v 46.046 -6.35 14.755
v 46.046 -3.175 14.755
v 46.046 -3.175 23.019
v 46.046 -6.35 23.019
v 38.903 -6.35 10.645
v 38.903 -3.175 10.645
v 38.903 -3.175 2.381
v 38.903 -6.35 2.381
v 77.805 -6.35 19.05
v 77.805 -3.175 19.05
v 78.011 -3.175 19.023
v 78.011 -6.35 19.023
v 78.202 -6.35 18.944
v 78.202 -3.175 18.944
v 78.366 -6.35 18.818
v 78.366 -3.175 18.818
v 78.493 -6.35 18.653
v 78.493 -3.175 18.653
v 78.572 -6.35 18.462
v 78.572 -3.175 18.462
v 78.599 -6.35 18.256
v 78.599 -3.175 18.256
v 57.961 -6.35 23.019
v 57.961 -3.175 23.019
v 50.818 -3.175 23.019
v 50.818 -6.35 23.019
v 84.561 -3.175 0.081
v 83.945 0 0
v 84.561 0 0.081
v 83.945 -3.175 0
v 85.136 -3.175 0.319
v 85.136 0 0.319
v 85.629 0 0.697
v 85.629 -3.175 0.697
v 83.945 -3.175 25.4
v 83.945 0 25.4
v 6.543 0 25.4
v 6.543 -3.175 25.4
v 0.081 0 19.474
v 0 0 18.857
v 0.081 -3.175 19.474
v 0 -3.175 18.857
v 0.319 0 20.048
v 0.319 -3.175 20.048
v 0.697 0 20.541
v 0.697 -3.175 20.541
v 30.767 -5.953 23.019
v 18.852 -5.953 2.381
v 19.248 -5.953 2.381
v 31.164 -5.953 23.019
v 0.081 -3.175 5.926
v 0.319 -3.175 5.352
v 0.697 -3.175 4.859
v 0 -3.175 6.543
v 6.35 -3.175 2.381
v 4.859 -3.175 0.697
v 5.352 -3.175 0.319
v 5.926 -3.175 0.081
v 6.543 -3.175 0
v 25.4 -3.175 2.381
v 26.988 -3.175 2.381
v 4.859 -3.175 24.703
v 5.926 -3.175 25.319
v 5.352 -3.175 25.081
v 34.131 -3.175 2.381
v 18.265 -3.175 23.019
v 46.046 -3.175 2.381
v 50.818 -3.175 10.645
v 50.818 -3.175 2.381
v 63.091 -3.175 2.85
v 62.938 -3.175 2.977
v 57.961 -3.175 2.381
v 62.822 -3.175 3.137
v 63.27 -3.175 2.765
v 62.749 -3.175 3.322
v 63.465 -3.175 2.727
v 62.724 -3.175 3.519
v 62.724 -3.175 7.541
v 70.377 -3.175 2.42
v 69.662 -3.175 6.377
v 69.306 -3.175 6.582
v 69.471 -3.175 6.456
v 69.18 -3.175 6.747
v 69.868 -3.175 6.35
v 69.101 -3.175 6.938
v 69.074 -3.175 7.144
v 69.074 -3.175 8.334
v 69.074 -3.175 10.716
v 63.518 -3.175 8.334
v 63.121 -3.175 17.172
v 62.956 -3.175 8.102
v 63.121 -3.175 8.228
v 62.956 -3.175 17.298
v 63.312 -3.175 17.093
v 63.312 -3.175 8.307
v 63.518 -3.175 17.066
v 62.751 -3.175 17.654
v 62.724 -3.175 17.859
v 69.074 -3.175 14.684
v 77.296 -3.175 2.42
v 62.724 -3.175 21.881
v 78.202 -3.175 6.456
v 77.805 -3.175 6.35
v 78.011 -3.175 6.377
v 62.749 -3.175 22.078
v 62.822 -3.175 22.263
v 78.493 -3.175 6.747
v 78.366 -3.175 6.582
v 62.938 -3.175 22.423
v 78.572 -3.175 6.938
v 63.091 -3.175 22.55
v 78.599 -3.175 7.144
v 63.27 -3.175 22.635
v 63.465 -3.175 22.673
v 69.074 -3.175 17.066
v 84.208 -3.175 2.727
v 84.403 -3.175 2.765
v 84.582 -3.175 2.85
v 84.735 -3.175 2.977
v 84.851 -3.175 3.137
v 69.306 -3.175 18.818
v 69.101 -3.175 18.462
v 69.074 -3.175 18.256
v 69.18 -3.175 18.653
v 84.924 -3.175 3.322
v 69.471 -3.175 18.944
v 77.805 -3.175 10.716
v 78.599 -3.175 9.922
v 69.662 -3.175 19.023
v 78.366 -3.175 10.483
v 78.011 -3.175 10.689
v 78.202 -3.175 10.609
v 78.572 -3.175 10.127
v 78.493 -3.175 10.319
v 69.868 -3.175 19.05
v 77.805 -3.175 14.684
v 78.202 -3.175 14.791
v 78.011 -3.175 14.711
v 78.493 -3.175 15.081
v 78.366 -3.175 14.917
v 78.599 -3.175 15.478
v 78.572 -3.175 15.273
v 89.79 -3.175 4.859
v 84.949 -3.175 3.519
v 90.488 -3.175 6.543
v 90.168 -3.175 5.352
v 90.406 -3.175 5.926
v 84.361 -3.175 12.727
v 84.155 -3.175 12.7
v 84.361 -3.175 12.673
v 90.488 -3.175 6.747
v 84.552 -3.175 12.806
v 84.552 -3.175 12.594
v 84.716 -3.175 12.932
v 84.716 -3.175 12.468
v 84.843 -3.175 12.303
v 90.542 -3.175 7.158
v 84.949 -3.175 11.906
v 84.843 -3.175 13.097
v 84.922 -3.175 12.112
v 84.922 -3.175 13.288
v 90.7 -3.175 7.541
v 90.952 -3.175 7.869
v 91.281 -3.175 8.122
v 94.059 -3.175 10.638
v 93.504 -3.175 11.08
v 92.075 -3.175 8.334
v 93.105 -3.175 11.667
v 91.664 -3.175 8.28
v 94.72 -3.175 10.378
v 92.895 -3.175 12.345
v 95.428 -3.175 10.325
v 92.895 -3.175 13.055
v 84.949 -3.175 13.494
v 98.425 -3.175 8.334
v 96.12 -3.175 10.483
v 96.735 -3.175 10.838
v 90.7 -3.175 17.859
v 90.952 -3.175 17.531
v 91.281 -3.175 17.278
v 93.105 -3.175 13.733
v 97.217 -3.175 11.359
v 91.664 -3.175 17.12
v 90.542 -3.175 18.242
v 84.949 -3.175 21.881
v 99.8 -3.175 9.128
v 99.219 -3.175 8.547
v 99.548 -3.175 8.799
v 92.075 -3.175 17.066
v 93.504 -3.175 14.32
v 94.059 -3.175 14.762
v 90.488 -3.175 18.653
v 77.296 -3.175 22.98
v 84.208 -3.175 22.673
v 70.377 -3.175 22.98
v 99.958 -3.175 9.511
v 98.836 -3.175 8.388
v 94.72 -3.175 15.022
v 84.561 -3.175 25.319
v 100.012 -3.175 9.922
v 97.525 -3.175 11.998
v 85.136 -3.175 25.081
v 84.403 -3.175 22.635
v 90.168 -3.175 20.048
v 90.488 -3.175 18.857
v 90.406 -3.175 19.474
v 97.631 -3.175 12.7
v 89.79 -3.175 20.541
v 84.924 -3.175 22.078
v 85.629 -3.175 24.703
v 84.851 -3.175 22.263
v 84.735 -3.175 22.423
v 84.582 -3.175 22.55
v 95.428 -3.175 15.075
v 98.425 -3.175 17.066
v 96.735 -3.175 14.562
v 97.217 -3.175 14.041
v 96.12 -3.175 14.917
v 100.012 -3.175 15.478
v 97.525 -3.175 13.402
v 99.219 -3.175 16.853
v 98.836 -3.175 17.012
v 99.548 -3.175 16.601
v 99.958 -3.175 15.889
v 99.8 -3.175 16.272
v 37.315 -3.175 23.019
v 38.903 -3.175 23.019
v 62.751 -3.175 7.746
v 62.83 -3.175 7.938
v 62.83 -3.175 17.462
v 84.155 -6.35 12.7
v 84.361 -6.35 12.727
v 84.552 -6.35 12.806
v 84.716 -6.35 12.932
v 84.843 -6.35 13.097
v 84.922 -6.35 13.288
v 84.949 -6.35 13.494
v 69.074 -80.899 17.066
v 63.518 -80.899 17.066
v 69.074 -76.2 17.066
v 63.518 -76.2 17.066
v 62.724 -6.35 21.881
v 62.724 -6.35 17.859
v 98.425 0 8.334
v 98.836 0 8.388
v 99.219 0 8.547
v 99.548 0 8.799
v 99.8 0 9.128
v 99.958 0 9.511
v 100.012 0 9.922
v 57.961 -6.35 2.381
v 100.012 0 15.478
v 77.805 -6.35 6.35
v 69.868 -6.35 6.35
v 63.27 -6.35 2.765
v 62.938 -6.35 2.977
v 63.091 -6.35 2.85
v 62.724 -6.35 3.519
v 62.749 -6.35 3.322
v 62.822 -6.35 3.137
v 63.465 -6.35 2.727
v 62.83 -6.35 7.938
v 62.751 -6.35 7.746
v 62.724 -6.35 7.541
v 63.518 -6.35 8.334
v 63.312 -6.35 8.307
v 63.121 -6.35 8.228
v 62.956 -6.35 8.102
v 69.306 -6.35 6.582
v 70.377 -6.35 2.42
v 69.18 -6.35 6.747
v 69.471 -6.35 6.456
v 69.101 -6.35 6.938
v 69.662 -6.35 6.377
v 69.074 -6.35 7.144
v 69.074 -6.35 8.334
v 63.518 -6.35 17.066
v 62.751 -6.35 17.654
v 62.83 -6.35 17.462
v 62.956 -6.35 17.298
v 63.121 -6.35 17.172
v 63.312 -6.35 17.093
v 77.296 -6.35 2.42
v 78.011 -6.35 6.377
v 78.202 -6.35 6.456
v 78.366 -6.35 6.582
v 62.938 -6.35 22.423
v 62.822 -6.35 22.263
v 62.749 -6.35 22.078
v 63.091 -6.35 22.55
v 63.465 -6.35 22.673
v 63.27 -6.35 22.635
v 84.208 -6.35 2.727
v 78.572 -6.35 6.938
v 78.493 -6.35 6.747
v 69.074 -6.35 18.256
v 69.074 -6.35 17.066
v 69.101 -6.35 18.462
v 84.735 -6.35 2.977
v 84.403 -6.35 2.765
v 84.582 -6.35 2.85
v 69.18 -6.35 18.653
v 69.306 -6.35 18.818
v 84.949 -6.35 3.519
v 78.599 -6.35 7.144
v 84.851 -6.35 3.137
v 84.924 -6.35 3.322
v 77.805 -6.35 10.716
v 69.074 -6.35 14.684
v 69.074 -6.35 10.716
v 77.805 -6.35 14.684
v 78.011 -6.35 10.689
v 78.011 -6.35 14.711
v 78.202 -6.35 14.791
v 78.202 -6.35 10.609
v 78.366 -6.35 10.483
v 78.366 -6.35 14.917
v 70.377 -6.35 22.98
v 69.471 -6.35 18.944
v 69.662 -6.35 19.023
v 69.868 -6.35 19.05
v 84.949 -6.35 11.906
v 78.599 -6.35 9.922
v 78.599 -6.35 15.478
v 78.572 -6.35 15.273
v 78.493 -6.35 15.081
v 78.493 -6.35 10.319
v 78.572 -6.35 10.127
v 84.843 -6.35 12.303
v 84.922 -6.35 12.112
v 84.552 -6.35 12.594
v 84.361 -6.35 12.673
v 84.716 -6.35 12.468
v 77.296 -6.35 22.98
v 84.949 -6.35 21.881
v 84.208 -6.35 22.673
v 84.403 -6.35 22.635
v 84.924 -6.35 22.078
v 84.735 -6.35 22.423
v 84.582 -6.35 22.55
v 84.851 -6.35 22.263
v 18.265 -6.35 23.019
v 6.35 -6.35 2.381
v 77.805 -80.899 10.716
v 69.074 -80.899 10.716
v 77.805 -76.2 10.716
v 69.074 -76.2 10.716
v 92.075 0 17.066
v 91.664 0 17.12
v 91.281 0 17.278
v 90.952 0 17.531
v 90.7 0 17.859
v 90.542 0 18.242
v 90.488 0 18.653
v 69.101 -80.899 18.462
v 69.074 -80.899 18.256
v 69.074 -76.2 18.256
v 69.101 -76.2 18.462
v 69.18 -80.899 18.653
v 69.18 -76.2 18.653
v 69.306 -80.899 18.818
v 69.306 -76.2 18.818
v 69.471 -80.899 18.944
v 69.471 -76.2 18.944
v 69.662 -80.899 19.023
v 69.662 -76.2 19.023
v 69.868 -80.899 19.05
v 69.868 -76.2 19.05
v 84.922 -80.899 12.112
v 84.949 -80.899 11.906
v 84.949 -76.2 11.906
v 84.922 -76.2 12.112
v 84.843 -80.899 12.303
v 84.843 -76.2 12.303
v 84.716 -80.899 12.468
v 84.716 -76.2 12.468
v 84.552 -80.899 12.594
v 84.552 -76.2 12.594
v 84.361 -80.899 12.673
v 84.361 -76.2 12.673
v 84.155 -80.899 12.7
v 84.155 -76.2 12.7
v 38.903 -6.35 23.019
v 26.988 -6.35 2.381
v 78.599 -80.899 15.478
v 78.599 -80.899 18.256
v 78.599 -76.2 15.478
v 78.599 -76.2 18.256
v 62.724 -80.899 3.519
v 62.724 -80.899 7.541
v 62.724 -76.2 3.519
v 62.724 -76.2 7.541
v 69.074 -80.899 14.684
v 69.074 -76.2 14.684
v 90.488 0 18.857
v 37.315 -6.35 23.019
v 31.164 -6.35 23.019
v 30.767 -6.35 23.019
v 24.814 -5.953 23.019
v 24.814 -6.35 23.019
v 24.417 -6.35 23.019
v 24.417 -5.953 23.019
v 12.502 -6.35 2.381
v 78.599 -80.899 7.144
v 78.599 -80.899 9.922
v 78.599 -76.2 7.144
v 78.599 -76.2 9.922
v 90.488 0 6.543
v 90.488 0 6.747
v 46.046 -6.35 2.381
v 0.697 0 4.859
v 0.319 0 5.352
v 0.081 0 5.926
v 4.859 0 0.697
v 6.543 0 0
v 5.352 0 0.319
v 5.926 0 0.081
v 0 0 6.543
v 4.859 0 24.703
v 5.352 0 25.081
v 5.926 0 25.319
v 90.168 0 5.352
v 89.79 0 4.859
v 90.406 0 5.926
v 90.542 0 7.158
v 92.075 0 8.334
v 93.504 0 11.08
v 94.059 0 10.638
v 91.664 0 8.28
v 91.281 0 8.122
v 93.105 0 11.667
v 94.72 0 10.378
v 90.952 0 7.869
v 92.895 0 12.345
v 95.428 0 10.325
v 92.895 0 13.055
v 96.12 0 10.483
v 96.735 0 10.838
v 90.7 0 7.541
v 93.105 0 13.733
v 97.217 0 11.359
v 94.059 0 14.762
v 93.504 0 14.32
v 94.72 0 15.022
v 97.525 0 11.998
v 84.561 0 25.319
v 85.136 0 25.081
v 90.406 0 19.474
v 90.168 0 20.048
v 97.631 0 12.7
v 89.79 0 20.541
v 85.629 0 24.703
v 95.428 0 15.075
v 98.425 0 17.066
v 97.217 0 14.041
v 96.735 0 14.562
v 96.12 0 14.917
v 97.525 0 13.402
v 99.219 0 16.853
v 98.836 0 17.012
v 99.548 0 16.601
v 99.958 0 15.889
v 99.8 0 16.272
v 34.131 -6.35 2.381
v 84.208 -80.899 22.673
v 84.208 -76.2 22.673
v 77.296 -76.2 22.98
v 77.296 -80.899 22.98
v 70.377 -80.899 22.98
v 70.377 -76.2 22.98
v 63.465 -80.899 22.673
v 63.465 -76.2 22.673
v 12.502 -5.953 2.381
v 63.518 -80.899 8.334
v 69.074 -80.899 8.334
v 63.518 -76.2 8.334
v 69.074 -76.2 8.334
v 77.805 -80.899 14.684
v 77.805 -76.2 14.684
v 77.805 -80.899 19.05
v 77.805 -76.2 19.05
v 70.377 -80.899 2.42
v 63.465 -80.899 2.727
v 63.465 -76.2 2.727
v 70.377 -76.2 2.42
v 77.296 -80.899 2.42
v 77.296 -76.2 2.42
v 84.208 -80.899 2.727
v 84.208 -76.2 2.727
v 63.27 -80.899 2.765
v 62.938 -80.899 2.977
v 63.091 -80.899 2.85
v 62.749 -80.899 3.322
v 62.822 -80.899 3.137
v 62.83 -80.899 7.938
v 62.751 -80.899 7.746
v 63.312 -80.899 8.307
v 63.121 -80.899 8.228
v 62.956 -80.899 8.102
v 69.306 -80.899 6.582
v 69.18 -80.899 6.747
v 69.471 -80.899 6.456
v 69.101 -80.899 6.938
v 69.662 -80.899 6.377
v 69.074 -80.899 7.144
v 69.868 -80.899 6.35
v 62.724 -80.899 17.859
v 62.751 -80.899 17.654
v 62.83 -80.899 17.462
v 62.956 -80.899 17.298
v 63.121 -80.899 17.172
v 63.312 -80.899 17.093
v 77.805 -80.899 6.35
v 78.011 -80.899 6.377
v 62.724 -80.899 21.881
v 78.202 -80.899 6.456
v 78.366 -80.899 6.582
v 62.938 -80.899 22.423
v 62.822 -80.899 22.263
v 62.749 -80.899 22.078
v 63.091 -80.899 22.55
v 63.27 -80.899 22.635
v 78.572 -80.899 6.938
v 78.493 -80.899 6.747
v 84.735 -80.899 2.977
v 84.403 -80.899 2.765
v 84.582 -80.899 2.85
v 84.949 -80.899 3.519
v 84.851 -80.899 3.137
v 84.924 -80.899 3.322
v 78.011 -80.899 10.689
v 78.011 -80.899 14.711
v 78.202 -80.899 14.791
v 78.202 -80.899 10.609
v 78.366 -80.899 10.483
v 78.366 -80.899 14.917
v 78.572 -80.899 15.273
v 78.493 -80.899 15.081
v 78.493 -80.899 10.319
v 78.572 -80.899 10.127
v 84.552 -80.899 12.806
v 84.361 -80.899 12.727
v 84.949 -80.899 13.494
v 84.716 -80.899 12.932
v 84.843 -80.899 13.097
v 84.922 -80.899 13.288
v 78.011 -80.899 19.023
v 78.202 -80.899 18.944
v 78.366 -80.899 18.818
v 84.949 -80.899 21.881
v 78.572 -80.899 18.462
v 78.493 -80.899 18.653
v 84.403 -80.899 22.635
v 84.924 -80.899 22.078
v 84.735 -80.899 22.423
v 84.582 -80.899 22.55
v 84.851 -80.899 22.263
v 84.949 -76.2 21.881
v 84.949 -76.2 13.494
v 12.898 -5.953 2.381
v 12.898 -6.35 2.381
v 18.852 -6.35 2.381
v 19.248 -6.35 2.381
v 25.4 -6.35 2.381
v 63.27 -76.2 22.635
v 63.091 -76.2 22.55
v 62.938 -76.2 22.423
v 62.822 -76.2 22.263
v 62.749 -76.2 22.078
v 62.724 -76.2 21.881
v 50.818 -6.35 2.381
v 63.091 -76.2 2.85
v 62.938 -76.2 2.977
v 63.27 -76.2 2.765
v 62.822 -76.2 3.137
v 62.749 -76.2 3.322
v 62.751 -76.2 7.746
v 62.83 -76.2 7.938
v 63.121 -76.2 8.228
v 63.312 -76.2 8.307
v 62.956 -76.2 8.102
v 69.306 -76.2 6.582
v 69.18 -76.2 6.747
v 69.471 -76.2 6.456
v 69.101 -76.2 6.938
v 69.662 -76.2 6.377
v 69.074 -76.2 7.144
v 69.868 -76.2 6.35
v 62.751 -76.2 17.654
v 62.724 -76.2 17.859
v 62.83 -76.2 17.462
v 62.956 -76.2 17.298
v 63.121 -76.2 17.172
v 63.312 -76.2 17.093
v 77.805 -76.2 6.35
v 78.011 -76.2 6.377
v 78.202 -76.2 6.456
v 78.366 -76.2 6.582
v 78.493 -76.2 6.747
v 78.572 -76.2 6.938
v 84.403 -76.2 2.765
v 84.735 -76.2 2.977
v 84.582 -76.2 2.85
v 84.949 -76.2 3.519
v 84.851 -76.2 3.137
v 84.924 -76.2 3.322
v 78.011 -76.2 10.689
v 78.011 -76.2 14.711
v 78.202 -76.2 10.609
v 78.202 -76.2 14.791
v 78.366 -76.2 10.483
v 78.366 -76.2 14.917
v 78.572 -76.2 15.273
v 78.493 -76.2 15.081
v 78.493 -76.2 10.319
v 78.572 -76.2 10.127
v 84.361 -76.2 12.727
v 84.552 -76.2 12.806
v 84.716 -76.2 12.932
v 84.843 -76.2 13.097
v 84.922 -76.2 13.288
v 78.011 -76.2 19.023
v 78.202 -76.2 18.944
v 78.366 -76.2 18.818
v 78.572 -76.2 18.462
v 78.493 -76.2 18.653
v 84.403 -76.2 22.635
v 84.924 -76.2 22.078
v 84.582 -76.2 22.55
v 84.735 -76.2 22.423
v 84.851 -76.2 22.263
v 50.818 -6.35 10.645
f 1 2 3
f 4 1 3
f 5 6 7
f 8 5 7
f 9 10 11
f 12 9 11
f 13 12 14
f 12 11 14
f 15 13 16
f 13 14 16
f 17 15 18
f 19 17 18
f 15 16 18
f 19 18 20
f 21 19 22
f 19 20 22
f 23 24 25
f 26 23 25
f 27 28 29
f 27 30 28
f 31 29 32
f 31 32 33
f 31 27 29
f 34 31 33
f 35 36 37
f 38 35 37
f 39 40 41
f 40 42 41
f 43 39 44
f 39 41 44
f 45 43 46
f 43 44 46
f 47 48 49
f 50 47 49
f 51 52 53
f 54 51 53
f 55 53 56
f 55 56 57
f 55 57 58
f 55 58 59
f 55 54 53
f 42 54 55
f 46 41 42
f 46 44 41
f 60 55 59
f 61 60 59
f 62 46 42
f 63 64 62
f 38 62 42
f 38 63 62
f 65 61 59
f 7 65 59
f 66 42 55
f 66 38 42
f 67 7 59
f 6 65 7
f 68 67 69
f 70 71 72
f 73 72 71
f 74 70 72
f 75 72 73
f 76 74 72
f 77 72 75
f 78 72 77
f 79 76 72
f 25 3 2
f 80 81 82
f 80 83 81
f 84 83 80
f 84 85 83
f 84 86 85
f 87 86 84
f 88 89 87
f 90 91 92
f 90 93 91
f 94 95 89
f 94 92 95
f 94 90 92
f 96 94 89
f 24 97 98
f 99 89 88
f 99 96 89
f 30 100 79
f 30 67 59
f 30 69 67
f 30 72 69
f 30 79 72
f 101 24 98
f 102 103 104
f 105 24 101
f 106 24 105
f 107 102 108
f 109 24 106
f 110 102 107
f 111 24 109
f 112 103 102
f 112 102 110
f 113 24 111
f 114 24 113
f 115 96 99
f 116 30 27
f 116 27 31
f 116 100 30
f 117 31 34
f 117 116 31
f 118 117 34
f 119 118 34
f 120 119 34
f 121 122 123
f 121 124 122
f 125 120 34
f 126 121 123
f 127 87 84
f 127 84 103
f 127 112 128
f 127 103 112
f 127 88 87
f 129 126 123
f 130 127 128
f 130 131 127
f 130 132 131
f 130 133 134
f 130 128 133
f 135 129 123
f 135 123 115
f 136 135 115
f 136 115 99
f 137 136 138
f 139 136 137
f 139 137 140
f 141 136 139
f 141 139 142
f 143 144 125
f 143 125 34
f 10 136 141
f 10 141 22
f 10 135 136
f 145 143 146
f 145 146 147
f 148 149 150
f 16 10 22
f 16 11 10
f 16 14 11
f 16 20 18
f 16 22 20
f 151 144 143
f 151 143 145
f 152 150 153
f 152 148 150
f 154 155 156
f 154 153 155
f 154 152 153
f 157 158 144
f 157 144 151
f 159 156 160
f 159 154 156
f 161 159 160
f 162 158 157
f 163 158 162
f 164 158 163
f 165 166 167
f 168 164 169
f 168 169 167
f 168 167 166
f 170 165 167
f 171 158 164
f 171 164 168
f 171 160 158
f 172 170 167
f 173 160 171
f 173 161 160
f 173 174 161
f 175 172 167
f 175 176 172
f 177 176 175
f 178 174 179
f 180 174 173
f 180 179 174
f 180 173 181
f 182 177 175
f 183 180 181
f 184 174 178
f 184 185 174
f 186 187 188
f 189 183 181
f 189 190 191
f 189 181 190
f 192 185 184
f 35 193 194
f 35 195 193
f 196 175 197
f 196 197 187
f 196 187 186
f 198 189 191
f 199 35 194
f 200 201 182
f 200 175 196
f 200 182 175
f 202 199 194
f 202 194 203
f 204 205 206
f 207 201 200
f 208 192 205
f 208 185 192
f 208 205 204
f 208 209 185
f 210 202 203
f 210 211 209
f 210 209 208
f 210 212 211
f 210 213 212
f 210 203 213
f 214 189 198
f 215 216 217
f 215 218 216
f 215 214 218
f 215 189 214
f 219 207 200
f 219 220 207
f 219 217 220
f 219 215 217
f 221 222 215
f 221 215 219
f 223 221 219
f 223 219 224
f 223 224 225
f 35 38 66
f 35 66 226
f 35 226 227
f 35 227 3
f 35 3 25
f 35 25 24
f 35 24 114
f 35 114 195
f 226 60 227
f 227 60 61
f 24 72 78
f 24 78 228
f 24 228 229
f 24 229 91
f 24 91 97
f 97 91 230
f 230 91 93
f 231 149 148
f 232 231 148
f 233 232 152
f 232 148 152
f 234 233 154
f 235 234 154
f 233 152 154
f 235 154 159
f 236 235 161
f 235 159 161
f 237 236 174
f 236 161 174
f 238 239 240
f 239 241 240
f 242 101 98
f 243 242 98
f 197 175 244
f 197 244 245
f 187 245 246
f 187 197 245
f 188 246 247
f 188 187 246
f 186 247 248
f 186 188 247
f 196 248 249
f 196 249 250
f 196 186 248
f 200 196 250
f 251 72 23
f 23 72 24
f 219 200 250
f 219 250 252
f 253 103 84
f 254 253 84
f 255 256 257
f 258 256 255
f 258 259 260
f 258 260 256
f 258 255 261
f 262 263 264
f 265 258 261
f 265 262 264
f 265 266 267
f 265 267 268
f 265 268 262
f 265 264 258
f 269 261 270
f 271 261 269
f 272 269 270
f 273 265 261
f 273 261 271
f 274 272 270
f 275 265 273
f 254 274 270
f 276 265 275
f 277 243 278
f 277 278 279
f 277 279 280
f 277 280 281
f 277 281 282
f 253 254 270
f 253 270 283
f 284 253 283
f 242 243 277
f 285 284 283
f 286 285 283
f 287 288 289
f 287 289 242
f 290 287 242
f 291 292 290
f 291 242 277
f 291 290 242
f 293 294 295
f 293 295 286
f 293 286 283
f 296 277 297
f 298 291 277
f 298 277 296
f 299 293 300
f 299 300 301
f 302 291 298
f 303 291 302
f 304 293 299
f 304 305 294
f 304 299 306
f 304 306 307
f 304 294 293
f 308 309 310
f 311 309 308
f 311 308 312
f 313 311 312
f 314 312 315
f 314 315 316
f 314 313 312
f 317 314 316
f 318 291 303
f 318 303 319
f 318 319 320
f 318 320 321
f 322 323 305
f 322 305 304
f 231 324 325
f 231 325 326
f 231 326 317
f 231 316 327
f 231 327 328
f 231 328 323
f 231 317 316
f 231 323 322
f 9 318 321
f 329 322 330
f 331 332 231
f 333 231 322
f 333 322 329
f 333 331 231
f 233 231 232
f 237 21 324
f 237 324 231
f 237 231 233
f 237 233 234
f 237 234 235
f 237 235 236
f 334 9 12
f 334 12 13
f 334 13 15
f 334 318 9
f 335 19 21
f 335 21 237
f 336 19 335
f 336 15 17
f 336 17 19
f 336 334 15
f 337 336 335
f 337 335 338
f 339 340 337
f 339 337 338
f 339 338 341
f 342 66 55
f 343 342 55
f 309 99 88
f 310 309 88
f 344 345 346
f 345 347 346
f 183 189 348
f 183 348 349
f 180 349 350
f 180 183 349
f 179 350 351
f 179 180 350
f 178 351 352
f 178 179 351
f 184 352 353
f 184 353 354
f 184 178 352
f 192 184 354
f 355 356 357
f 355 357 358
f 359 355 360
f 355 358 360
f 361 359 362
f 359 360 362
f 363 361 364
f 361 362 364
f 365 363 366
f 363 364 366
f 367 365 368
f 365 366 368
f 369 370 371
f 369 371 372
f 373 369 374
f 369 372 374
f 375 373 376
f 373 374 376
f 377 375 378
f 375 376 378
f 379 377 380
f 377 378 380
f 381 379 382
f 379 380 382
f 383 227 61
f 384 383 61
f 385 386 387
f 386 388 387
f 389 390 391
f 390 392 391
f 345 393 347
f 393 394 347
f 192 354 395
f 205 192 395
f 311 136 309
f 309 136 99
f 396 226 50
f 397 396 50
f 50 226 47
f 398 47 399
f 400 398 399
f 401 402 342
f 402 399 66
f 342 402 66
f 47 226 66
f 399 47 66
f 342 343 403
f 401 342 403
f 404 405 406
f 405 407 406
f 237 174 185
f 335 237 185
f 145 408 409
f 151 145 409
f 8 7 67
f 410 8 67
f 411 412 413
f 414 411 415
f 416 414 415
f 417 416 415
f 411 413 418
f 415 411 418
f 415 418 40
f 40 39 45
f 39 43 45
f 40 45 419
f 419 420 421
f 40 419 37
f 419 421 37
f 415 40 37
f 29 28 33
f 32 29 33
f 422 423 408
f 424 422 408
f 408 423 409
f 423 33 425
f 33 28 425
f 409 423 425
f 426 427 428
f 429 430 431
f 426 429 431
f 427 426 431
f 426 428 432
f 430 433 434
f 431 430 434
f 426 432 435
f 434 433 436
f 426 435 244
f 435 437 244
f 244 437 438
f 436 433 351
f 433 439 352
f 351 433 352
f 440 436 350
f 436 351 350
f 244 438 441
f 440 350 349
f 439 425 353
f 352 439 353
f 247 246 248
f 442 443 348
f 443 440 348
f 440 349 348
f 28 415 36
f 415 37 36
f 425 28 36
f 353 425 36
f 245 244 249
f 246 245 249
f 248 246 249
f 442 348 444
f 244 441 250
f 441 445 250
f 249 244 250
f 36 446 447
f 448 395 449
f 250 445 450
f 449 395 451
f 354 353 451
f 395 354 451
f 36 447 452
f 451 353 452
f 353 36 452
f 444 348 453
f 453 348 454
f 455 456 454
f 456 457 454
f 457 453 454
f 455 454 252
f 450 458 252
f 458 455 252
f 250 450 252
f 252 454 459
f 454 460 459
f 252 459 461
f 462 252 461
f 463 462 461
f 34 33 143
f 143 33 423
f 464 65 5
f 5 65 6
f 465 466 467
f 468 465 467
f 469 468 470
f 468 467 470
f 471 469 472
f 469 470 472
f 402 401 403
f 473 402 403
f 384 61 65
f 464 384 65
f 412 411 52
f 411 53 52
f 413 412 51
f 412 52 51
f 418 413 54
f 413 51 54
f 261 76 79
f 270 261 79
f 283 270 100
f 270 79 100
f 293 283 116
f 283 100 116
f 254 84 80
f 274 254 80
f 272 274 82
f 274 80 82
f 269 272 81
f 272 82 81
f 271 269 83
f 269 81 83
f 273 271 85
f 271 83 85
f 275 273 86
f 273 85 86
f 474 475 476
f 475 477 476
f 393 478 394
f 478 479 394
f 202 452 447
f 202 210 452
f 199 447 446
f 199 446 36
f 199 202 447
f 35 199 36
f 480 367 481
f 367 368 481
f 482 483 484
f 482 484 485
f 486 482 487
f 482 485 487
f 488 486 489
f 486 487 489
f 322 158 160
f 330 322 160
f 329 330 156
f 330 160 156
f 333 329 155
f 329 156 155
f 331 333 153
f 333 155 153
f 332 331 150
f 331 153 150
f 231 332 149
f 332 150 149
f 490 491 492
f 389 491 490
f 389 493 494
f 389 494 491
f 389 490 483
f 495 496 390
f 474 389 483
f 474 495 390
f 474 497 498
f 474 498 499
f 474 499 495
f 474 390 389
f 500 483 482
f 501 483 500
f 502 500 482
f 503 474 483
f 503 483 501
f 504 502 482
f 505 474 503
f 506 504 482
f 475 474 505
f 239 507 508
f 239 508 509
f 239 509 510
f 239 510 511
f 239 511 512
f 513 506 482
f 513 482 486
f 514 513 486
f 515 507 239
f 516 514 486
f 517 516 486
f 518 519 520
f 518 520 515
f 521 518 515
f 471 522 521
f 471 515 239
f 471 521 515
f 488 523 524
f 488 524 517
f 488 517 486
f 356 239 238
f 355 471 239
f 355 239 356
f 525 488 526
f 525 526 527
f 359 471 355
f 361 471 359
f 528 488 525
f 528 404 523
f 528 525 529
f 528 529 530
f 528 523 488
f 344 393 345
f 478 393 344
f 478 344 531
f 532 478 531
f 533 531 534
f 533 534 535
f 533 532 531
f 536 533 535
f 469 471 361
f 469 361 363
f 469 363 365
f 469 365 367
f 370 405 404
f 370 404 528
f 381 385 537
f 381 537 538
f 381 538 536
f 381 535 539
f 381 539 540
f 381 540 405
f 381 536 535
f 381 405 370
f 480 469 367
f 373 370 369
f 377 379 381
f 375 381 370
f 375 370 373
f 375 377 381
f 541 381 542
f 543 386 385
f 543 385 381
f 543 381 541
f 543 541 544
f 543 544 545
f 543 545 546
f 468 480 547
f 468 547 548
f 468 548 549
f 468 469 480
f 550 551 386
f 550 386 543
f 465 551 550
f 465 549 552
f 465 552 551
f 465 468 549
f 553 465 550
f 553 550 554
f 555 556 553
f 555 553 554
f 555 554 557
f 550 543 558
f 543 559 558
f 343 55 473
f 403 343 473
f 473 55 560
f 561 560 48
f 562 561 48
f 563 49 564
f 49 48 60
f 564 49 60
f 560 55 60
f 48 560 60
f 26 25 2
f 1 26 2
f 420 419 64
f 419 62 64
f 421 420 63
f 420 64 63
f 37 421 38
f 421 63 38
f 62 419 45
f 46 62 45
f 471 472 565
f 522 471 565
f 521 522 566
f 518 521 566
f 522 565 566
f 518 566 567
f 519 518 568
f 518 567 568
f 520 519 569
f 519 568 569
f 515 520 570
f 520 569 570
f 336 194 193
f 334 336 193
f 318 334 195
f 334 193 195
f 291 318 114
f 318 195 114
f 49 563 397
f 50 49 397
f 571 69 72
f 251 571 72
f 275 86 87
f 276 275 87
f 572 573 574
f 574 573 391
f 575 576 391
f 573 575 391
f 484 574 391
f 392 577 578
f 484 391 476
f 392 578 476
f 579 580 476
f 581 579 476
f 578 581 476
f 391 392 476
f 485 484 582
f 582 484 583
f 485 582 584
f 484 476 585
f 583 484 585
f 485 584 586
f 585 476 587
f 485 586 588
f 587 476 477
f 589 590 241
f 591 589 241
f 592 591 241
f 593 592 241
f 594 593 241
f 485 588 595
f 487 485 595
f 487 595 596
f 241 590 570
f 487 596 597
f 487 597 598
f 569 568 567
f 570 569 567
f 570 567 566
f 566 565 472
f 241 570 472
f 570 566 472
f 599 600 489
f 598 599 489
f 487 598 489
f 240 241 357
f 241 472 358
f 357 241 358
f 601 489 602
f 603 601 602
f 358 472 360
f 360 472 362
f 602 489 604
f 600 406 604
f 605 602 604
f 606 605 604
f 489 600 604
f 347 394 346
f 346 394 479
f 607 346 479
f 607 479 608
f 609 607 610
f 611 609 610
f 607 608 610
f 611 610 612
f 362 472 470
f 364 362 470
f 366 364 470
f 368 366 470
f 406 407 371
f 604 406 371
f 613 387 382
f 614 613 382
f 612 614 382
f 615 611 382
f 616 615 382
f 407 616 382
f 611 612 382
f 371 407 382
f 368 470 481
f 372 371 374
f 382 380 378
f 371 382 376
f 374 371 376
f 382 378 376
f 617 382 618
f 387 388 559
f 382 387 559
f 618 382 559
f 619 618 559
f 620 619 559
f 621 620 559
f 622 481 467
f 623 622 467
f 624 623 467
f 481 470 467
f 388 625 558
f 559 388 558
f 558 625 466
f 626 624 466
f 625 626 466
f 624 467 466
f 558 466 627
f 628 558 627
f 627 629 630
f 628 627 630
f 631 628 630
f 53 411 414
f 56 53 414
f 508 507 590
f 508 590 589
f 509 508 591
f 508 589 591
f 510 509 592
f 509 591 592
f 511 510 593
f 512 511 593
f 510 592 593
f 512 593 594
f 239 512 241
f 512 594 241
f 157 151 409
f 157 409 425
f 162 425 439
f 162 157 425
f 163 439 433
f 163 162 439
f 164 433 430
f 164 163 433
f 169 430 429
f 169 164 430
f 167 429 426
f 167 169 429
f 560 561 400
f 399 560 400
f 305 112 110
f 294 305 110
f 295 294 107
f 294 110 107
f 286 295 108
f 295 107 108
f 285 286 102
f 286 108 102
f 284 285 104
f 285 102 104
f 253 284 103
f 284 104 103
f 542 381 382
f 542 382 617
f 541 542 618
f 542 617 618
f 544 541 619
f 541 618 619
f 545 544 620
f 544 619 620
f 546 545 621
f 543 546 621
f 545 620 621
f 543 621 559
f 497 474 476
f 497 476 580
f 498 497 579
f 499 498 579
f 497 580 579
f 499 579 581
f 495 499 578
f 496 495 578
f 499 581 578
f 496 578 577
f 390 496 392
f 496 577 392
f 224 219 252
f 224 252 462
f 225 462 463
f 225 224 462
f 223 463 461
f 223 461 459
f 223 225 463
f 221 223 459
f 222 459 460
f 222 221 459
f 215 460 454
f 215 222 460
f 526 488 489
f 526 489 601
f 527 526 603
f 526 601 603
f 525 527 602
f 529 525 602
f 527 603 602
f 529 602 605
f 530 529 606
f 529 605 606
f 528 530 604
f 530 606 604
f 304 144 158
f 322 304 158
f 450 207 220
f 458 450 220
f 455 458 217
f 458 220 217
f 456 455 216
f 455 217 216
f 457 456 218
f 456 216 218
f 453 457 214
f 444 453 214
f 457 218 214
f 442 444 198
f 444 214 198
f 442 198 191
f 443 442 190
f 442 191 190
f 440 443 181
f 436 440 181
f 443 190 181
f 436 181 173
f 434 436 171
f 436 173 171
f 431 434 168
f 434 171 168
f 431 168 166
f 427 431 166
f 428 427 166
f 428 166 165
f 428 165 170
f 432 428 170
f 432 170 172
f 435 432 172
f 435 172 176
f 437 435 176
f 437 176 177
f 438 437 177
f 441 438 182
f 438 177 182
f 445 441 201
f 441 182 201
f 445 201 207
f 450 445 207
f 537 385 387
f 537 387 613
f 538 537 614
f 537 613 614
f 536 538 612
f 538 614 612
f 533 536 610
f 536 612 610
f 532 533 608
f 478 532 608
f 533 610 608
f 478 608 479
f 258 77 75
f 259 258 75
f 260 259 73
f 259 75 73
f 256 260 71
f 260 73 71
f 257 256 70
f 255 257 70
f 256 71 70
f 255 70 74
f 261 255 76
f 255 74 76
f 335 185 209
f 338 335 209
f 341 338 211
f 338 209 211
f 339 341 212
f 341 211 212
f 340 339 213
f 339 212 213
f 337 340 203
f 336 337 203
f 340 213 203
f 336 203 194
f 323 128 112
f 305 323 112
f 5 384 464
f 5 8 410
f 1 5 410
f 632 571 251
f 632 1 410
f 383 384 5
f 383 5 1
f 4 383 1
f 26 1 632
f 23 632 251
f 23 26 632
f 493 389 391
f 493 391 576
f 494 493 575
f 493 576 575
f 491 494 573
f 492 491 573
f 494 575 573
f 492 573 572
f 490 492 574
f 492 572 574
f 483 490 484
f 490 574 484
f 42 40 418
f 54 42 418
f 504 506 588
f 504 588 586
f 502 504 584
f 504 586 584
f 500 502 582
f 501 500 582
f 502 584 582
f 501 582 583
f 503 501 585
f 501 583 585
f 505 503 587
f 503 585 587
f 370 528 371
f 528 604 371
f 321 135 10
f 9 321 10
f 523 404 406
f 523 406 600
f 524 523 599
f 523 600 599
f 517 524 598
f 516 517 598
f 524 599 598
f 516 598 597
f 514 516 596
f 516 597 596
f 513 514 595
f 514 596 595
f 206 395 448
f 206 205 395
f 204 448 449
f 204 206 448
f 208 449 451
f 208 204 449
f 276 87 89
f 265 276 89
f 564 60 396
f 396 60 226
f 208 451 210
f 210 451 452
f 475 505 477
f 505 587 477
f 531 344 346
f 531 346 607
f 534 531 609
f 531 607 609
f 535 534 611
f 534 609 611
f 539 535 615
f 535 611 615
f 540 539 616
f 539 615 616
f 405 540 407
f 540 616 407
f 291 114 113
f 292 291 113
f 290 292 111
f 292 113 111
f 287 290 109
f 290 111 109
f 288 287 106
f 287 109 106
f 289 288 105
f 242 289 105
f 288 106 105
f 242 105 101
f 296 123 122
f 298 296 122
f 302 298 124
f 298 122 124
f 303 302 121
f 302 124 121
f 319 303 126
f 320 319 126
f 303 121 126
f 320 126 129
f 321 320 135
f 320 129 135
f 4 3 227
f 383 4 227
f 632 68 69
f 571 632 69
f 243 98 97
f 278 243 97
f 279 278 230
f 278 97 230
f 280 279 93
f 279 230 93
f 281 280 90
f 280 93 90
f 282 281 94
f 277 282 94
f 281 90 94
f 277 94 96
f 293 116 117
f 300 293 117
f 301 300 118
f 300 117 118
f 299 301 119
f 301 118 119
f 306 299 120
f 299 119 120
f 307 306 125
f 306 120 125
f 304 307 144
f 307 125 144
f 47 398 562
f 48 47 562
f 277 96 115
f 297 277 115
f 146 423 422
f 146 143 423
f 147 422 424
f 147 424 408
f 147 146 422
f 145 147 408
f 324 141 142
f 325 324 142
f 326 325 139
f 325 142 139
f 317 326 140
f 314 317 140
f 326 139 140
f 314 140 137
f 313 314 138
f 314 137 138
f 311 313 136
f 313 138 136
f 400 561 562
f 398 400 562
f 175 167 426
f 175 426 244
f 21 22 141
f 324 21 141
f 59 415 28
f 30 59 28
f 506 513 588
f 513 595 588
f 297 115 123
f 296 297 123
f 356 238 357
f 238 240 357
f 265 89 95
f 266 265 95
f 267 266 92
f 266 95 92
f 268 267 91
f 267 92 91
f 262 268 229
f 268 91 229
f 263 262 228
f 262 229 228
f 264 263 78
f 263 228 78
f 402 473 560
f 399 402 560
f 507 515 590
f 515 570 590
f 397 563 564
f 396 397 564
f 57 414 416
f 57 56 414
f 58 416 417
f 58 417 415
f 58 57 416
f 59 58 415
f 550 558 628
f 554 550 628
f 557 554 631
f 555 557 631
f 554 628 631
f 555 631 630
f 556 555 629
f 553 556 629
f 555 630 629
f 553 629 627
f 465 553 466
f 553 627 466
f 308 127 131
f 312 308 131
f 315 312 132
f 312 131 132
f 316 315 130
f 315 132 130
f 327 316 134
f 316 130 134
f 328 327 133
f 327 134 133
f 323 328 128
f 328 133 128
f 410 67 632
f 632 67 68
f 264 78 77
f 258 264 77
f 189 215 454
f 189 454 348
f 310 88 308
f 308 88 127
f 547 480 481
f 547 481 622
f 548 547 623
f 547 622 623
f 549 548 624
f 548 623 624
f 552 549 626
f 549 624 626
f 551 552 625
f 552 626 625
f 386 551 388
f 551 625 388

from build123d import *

# Parameters (mm, degrees)
F1_DEPTH  = 3.175
F3_DEPTH  = 3.175
F5_DEPTH  = 0.396875
F6_R      = 2.38125
F7_R      = 2.38125
F8_DEPTH  = 3.175
F11_DEPTH = 3.175
F12_DEPTH = 1.524


# Not quite as in the source:
# - a feature names something its author has since deleted; it is built from what else it names


with BuildPart() as f1:
    # F0 (on Front) → F1 (new body)
    with BuildSketch(Plane.XZ):
        Polygon((0, 5.55625), (5.55625, 0), (84.93125, 0), (90.4875, 5.55625), (90.4875, 19.84375), (84.93125, 25.4), (5.55625, 25.4), (0, 19.84375), align=None)
    extrude(amount=F1_DEPTH)

    # F2 (on face) → F3 (join)
    with BuildSketch(Plane.XZ.offset(3.175)):
        Polygon((18.2650661804, 23.01875), (6.35, 2.38125), (25.4, 2.38125), (37.3150661804, 23.01875), align=None)
        Polygon((38.9025661804, 23.01875), (26.9875, 2.38125), (34.13125, 2.38125), (38.9025661804, 10.6454120434), (38.9025661804, 2.38125), (46.0463161804, 2.38125), (50.8176323608, 10.6454120434), (50.8176323608, 2.38125), (57.9613823608, 2.38125), (57.9613823608, 23.01875), (50.8176323608, 23.01875), (46.0463161804, 14.7545879566), (46.0463161804, 23.01875), align=None)
        with BuildLine():
            ThreePointArc((63.4647834492, 22.6730891893), (62.9379825156, 22.4233597915), (62.7238823608, 21.8811005183))
            Line((62.7238823608, 21.8811005183), (62.7238823608, 17.859375))
            ThreePointArc((62.7238823608, 17.859375), (62.9563663532, 17.2981089924), (63.5176323608, 17.065625))
            Line((63.5176323608, 17.065625), (69.0738823608, 17.065625))
            Line((69.0738823608, 17.065625), (69.0738823608, 18.25625))
            ThreePointArc((69.0738823608, 18.25625), (69.3063663532, 18.8175160076), (69.8676323608, 19.05))
            Line((69.8676323608, 19.05), (77.8051323608, 19.05))
            ThreePointArc((77.8051323608, 19.05), (78.3663983684, 18.8175160076), (78.5988823608, 18.25625))
            Line((78.5988823608, 18.25625), (78.5988823608, 15.478125))
            ThreePointArc((78.5988823608, 15.478125), (78.3663983684, 14.9168589924), (77.8051323608, 14.684375))
            Line((77.8051323608, 14.684375), (69.0738823608, 14.684375))
            Line((69.0738823608, 14.684375), (69.0738823608, 10.715625))
            Line((69.0738823608, 10.715625), (77.8051323608, 10.715625))
            ThreePointArc((77.8051323608, 10.715625), (78.3663983684, 10.4831410076), (78.5988823608, 9.921875))
            Line((78.5988823608, 9.921875), (78.5988823608, 7.14375))
            ThreePointArc((78.5988823608, 7.14375), (78.3663983684, 6.5824839924), (77.8051323608, 6.35))
            Line((77.8051323608, 6.35), (69.8676323608, 6.35))
            ThreePointArc((69.8676323608, 6.35), (69.3063663532, 6.5824839924), (69.0738823608, 7.14375))
            Line((69.0738823608, 7.14375), (69.0738823608, 8.334375))
            Line((69.0738823608, 8.334375), (63.5176323608, 8.334375))
            ThreePointArc((63.5176323608, 8.334375), (62.9563663532, 8.1018910076), (62.7238823608, 7.540625))
            Line((62.7238823608, 7.540625), (62.7238823608, 3.5188994817))
            ThreePointArc((62.7238823608, 3.5188994817), (62.9379825156, 2.9766402085), (63.4647834492, 2.7269108107))
            ThreePointArc((63.4647834492, 2.7269108107), (73.8363823608, 2.38125), (84.2079812725, 2.7269108107))
            ThreePointArc((84.2079812725, 2.7269108107), (84.734782206, 2.9766402085), (84.9488823608, 3.5188994817))
            Line((84.9488823608, 3.5188994817), (84.9488823608, 11.90625))
            ThreePointArc((84.9488823608, 11.90625), (84.7163983684, 12.4675160076), (84.1551323608, 12.7))
            ThreePointArc((84.1551323608, 12.7), (84.7163983684, 12.9324839924), (84.9488823608, 13.49375))
            Line((84.9488823608, 13.49375), (84.9488823608, 16.8671875))
            Line((84.9488823608, 16.8671875), (84.9488823608, 21.8811005183))
            ThreePointArc((84.9488823608, 21.8811005183), (84.734782206, 22.4233597915), (84.2079812725, 22.6730891893))
            ThreePointArc((84.2079812725, 22.6730891893), (73.8363823608, 23.01875), (63.4647834492, 22.6730891893))
        make_face()
    extrude(amount=F3_DEPTH)

    # F4 (on face) → F5 (cut)
    with BuildSketch(Plane.XZ.offset(6.35)):
        Polygon((19.2484375, 2.38125), (31.1635036804, 23.01875), (30.7666286804, 23.01875), (18.8515625, 2.38125), align=None)
        Polygon((12.8984375, 2.38125), (24.8135036804, 23.01875), (24.4166286804, 23.01875), (12.5015625, 2.38125), align=None)
    extrude(amount=-F5_DEPTH, mode=Mode.SUBTRACT)

    # F6
    f6_edges = [f1.edges().sort_by_distance(p)[0] for p in [
        (90.4875, -1.5875, 19.84375),
        (84.93125, -1.5875, 25.4),
        (5.55625, -1.5875, 25.4),
        (5.55625, -1.5875, 0),
        (0, -1.5875, 5.55625),
        (0, -1.5875, 19.84375),
        (84.93125, -1.5875, 0),
        (90.4875, -1.5875, 5.55625),
    ]]
    fillet(f6_edges, radius=F6_R)

    # F7 (on face) → F8 (join, through all)
    with BuildSketch(Plane.XZ.offset(3.175)):
        with BuildLine():
            ThreePointArc((98.425, 8.334375), (99.5475320151, 8.7993429849), (100.0125, 9.921875))
            Line((100.0125, 9.921875), (100.0125, 15.478125))
            ThreePointArc((100.0125, 15.478125), (99.5475320151, 16.6006570151), (98.425, 17.065625))
            Line((98.425, 17.065625), (92.075, 17.065625))
            ThreePointArc((92.075, 17.065625), (90.9524679849, 17.5305929849), (90.4875, 18.653125))
            Line((90.4875, 18.653125), (90.4875, 6.746875))
            ThreePointArc((90.4875, 6.746875), (90.9524679849, 7.8694070151), (92.075, 8.334375))
            Line((92.075, 8.334375), (98.425, 8.334375))
        make_face()
        with Locations((95.25, 12.7)):
            Circle(F7_R, mode=Mode.SUBTRACT)
    extrude(amount=-F8_DEPTH)


with BuildPart() as f11:
    # F10 (on offset) → F11 (new body)
    with BuildSketch(Plane.XZ.offset(76.2)):
        with BuildLine():
            ThreePointArc((63.4647834492, 22.6730891893), (62.9379825156, 22.4233597915), (62.7238823608, 21.8811005183))
            Line((62.7238823608, 21.8811005183), (62.7238823608, 17.859375))
            ThreePointArc((62.7238823608, 17.859375), (62.9563663532, 17.2981089924), (63.5176323608, 17.065625))
            Line((63.5176323608, 17.065625), (69.0738823608, 17.065625))
            Line((69.0738823608, 17.065625), (69.0738823608, 18.25625))
            ThreePointArc((69.0738823608, 18.25625), (69.3063663532, 18.8175160076), (69.8676323608, 19.05))
            Line((69.8676323608, 19.05), (77.8051323608, 19.05))
            ThreePointArc((77.8051323608, 19.05), (78.3663983684, 18.8175160076), (78.5988823608, 18.25625))
            Line((78.5988823608, 18.25625), (78.5988823608, 15.478125))
            ThreePointArc((78.5988823608, 15.478125), (78.3663983684, 14.9168589924), (77.8051323608, 14.684375))
            Line((77.8051323608, 14.684375), (69.0738823608, 14.684375))
            Line((69.0738823608, 14.684375), (69.0738823608, 12.7))
            Line((69.0738823608, 12.7), (69.0738823608, 10.715625))
            Line((69.0738823608, 10.715625), (77.8051323608, 10.715625))
            ThreePointArc((77.8051323608, 10.715625), (78.3663983684, 10.4831410076), (78.5988823608, 9.921875))
            Line((78.5988823608, 9.921875), (78.5988823608, 7.14375))
            ThreePointArc((78.5988823608, 7.14375), (78.3663983684, 6.5824839924), (77.8051323608, 6.35))
            Line((77.8051323608, 6.35), (69.8676323608, 6.35))
            ThreePointArc((69.8676323608, 6.35), (69.3063663532, 6.5824839924), (69.0738823608, 7.14375))
            Line((69.0738823608, 7.14375), (69.0738823608, 8.334375))
            Line((69.0738823608, 8.334375), (63.5176323608, 8.334375))
            ThreePointArc((63.5176323608, 8.334375), (62.9563663532, 8.1018910076), (62.7238823608, 7.540625))
            Line((62.7238823608, 7.540625), (62.7238823608, 3.5188994817))
            ThreePointArc((62.7238823608, 3.5188994817), (62.9379825156, 2.9766402085), (63.4647834492, 2.7269108107))
            ThreePointArc((63.4647834492, 2.7269108107), (73.8363823608, 2.38125), (84.2079812725, 2.7269108107))
            ThreePointArc((84.2079812725, 2.7269108107), (84.734782206, 2.9766402085), (84.9488823608, 3.5188994817))
            Line((84.9488823608, 3.5188994817), (84.9488823608, 11.90625))
            ThreePointArc((84.9488823608, 11.90625), (84.7163983684, 12.4675160076), (84.1551323608, 12.7))
            ThreePointArc((84.1551323608, 12.7), (84.7163983684, 12.9324839924), (84.9488823608, 13.49375))
            Line((84.9488823608, 13.49375), (84.9488823608, 16.8671875))
            Line((84.9488823608, 16.8671875), (84.9488823608, 21.8811005183))
            ThreePointArc((84.9488823608, 21.8811005183), (84.734782206, 22.4233597915), (84.2079812725, 22.6730891893))
            ThreePointArc((84.2079812725, 22.6730891893), (73.8363823608, 23.01875), (63.4647834492, 22.6730891893))
        make_face()
    extrude(amount=F11_DEPTH)

    # F12 (add): a face of the model
    f12_faces = [f11.faces().sort_by_distance(p)[0] for p in [
        (75.2419009789, -79.375, 12.7),
    ]]
    extrude(f12_faces, amount=F12_DEPTH)


solid = Compound([f1.part, f11.part])
